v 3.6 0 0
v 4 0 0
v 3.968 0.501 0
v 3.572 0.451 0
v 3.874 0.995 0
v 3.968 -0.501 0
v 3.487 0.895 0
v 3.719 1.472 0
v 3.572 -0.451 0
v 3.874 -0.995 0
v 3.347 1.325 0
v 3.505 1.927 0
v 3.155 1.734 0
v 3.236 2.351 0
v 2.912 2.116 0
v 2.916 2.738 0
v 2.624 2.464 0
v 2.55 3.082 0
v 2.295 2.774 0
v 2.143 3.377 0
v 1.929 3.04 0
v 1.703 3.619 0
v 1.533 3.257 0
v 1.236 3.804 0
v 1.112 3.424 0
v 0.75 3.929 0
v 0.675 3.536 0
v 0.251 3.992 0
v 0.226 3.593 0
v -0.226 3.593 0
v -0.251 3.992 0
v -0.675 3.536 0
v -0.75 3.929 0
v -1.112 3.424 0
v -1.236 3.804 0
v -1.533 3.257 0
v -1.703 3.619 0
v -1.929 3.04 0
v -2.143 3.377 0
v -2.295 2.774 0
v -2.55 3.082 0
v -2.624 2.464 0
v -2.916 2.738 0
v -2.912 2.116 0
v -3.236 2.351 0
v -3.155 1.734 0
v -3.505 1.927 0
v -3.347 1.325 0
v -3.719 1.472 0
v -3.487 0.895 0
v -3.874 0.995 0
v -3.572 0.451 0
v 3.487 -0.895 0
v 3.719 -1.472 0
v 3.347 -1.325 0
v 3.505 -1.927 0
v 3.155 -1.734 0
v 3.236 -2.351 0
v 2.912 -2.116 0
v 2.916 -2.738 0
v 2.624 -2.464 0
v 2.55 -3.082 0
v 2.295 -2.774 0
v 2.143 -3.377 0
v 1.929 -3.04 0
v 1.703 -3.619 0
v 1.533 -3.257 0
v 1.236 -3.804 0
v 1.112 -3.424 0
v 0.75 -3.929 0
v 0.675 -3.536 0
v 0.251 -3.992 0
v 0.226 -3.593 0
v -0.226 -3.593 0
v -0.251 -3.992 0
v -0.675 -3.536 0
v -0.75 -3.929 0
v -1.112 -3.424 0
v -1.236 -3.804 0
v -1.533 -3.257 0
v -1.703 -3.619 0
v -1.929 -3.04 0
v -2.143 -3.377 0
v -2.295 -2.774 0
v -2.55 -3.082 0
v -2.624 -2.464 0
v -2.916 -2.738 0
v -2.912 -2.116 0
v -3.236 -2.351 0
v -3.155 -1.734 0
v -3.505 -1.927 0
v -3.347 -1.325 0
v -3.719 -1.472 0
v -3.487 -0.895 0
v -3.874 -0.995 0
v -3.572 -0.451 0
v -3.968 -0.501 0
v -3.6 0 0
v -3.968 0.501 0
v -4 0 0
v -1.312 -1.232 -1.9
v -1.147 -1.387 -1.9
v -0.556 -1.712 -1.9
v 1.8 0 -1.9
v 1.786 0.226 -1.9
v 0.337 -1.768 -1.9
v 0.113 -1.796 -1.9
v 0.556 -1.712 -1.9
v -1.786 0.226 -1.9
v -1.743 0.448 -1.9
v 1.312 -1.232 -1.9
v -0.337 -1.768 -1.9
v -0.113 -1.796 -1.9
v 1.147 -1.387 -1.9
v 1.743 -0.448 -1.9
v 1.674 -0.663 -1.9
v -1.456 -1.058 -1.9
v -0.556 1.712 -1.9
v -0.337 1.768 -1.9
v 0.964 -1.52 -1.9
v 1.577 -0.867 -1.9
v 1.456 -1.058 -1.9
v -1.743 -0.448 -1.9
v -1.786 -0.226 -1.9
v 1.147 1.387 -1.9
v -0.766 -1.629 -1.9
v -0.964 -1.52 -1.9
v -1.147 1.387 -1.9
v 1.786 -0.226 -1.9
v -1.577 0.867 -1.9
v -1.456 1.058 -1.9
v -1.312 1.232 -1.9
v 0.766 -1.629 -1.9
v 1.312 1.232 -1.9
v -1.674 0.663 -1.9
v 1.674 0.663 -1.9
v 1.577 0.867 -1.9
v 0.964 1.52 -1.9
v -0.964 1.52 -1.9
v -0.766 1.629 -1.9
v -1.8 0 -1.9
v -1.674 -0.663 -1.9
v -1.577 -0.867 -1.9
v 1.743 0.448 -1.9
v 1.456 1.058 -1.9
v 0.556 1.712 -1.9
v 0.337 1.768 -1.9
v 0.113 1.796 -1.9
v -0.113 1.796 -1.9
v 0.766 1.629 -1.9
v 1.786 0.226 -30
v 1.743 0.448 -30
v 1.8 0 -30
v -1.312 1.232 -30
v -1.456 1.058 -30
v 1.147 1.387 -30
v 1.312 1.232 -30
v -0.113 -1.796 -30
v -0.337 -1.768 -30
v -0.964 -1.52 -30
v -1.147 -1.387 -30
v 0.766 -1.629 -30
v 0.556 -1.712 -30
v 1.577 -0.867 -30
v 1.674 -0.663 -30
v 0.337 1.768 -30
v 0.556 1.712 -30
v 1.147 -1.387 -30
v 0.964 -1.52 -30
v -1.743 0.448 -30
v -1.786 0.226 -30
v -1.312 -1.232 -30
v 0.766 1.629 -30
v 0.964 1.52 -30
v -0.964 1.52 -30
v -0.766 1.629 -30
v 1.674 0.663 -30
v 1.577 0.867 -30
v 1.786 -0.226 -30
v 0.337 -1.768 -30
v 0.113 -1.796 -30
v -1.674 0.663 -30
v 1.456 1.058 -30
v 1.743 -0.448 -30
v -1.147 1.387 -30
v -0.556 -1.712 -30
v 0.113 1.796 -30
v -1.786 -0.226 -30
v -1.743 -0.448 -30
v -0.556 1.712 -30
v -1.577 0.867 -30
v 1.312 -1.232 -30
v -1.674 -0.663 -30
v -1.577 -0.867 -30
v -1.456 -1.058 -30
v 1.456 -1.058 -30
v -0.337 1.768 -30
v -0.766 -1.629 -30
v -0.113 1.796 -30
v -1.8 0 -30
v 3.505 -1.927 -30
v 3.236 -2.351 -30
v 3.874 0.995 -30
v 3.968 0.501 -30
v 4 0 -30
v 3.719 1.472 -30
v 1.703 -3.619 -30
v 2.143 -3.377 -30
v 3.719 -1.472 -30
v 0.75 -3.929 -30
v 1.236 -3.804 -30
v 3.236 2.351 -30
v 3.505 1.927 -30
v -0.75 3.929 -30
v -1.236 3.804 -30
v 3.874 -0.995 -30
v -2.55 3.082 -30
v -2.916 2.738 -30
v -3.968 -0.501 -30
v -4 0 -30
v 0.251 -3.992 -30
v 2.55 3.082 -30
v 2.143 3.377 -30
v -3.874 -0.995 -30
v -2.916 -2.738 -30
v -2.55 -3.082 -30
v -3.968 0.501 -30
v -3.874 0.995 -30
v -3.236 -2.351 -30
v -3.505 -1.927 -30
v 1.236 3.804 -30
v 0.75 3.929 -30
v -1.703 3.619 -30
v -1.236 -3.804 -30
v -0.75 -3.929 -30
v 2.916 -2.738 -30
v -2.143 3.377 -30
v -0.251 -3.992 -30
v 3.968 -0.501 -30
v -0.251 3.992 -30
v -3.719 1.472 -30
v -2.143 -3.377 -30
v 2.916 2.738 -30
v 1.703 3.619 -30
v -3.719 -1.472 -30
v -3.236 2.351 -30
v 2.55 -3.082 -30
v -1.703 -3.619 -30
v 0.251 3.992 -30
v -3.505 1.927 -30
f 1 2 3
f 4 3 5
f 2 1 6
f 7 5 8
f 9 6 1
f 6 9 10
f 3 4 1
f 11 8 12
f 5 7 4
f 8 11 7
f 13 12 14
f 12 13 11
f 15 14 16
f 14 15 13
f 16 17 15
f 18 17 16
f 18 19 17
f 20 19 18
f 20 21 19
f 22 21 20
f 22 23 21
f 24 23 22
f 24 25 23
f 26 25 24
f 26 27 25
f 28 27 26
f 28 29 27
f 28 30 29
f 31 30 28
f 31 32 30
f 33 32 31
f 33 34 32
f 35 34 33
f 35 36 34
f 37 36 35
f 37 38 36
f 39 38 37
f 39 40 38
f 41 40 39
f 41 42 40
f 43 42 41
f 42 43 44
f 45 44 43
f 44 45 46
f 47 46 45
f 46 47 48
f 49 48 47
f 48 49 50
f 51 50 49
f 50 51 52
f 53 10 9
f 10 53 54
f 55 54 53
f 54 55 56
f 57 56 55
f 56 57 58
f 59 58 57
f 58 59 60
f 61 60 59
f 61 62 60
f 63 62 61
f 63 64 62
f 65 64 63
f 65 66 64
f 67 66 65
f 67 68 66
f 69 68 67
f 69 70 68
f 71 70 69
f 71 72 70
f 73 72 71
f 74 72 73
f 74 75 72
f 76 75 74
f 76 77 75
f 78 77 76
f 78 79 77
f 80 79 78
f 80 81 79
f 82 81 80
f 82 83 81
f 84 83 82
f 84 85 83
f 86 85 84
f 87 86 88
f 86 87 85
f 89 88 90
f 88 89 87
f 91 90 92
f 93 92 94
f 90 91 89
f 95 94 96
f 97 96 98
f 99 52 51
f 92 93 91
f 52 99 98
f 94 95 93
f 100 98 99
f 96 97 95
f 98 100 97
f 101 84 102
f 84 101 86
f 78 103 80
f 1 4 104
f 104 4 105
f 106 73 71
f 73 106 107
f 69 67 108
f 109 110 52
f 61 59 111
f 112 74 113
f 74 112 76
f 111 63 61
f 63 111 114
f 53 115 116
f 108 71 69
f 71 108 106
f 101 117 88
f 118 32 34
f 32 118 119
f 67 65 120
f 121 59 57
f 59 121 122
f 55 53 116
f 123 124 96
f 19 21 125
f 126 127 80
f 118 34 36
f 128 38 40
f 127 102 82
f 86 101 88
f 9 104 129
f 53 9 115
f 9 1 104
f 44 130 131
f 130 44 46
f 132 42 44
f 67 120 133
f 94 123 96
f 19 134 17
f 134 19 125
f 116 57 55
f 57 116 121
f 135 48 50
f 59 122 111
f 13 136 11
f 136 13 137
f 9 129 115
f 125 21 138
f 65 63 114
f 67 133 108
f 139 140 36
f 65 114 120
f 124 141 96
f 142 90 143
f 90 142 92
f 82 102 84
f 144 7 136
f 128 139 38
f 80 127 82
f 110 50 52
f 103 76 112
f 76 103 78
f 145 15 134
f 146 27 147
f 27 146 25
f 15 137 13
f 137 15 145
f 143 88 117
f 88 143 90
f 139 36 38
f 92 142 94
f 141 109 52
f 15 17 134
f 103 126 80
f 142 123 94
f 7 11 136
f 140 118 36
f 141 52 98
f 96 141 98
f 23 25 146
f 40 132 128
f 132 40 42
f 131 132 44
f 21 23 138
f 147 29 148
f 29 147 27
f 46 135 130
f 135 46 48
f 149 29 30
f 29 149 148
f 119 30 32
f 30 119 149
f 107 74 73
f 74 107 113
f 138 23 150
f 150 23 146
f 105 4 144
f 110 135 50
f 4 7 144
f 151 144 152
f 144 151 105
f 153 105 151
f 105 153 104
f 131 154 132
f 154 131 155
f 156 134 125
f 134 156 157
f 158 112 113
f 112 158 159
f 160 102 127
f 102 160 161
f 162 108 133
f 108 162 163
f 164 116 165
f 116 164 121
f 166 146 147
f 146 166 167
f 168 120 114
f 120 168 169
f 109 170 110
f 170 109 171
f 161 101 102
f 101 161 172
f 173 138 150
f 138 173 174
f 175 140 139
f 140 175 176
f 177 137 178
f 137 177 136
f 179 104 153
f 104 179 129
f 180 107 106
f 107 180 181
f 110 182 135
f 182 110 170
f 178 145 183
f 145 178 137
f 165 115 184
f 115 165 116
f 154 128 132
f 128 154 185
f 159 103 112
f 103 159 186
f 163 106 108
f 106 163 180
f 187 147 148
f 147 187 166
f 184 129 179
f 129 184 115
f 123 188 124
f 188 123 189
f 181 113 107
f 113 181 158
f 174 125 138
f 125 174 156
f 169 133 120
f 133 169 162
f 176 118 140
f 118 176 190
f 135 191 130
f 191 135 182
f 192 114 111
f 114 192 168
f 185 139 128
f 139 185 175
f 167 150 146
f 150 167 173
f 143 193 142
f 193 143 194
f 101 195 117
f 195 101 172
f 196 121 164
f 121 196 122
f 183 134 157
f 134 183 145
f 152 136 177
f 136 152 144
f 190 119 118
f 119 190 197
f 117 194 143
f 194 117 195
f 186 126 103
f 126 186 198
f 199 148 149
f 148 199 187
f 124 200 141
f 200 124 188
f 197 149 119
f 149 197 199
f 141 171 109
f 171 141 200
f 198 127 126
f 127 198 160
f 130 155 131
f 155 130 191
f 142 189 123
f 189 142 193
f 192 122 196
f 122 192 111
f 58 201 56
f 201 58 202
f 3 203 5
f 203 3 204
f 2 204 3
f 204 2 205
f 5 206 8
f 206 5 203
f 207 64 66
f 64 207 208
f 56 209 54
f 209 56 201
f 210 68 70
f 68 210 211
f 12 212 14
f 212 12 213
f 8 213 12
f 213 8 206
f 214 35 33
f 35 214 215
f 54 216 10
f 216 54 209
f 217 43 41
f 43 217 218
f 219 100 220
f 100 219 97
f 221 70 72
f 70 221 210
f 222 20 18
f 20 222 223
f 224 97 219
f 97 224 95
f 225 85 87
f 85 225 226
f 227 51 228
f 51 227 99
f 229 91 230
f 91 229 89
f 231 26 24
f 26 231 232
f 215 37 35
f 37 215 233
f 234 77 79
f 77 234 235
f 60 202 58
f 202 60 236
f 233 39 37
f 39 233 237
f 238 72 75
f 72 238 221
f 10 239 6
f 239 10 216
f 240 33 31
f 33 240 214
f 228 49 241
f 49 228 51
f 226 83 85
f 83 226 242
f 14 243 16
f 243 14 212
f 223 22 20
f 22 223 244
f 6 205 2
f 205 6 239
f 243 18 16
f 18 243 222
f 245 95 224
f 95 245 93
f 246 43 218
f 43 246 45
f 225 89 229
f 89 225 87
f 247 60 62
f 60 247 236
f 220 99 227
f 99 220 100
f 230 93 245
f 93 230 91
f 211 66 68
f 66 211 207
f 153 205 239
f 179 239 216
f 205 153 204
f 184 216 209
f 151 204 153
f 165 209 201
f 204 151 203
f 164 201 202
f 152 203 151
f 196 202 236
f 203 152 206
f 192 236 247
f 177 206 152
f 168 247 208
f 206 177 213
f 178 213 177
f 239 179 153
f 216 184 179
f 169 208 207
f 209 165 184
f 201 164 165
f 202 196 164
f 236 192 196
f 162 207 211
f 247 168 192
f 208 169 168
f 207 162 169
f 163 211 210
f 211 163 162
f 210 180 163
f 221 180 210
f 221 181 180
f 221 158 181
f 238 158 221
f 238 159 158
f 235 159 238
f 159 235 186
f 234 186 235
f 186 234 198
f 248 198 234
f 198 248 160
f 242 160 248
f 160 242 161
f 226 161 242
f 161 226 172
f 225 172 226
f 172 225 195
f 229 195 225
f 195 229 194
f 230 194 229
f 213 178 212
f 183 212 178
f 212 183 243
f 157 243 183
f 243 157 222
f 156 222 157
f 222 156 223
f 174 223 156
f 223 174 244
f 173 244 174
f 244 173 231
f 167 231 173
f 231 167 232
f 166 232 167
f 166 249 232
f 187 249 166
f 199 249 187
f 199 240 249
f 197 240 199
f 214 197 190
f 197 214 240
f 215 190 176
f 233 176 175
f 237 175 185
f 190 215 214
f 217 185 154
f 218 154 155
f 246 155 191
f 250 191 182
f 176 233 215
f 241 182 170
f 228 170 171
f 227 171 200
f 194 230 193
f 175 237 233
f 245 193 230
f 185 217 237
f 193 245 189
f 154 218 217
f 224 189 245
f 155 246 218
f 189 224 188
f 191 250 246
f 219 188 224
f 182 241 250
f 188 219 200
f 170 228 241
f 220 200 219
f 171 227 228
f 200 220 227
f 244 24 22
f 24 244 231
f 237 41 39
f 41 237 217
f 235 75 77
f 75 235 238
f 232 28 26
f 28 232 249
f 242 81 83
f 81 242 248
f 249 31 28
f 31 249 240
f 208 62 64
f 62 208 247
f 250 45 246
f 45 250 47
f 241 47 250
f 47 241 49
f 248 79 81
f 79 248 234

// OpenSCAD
$fn = 50;

difference() {
	union() {
		translate(v = [0, 0, -30.0]) {
			cylinder(h = 30, r = 4.0);
		}
	}
	union() {
		translate(v = [0, 0, 0]) {
			rotate(a = [0, 0, 0]) {
				difference() {
					union() {
						translate(v = [0, 0, -33.0]) {
							cylinder(h = 33, r = 1.5);
						}
						translate(v = [0, 0, -1.9]) {
							cylinder(h = 1.9, r1 = 1.8, r2 = 3.6);
						}
						translate(v = [0, 0, -33.0]) {
							cylinder(h = 33, r = 1.8);
						}
						translate(v = [0, 0, -33.0]) {
							cylinder(h = 33, r = 1.5);
						}
					}
					union();
				}
			}
		}
	}
}
